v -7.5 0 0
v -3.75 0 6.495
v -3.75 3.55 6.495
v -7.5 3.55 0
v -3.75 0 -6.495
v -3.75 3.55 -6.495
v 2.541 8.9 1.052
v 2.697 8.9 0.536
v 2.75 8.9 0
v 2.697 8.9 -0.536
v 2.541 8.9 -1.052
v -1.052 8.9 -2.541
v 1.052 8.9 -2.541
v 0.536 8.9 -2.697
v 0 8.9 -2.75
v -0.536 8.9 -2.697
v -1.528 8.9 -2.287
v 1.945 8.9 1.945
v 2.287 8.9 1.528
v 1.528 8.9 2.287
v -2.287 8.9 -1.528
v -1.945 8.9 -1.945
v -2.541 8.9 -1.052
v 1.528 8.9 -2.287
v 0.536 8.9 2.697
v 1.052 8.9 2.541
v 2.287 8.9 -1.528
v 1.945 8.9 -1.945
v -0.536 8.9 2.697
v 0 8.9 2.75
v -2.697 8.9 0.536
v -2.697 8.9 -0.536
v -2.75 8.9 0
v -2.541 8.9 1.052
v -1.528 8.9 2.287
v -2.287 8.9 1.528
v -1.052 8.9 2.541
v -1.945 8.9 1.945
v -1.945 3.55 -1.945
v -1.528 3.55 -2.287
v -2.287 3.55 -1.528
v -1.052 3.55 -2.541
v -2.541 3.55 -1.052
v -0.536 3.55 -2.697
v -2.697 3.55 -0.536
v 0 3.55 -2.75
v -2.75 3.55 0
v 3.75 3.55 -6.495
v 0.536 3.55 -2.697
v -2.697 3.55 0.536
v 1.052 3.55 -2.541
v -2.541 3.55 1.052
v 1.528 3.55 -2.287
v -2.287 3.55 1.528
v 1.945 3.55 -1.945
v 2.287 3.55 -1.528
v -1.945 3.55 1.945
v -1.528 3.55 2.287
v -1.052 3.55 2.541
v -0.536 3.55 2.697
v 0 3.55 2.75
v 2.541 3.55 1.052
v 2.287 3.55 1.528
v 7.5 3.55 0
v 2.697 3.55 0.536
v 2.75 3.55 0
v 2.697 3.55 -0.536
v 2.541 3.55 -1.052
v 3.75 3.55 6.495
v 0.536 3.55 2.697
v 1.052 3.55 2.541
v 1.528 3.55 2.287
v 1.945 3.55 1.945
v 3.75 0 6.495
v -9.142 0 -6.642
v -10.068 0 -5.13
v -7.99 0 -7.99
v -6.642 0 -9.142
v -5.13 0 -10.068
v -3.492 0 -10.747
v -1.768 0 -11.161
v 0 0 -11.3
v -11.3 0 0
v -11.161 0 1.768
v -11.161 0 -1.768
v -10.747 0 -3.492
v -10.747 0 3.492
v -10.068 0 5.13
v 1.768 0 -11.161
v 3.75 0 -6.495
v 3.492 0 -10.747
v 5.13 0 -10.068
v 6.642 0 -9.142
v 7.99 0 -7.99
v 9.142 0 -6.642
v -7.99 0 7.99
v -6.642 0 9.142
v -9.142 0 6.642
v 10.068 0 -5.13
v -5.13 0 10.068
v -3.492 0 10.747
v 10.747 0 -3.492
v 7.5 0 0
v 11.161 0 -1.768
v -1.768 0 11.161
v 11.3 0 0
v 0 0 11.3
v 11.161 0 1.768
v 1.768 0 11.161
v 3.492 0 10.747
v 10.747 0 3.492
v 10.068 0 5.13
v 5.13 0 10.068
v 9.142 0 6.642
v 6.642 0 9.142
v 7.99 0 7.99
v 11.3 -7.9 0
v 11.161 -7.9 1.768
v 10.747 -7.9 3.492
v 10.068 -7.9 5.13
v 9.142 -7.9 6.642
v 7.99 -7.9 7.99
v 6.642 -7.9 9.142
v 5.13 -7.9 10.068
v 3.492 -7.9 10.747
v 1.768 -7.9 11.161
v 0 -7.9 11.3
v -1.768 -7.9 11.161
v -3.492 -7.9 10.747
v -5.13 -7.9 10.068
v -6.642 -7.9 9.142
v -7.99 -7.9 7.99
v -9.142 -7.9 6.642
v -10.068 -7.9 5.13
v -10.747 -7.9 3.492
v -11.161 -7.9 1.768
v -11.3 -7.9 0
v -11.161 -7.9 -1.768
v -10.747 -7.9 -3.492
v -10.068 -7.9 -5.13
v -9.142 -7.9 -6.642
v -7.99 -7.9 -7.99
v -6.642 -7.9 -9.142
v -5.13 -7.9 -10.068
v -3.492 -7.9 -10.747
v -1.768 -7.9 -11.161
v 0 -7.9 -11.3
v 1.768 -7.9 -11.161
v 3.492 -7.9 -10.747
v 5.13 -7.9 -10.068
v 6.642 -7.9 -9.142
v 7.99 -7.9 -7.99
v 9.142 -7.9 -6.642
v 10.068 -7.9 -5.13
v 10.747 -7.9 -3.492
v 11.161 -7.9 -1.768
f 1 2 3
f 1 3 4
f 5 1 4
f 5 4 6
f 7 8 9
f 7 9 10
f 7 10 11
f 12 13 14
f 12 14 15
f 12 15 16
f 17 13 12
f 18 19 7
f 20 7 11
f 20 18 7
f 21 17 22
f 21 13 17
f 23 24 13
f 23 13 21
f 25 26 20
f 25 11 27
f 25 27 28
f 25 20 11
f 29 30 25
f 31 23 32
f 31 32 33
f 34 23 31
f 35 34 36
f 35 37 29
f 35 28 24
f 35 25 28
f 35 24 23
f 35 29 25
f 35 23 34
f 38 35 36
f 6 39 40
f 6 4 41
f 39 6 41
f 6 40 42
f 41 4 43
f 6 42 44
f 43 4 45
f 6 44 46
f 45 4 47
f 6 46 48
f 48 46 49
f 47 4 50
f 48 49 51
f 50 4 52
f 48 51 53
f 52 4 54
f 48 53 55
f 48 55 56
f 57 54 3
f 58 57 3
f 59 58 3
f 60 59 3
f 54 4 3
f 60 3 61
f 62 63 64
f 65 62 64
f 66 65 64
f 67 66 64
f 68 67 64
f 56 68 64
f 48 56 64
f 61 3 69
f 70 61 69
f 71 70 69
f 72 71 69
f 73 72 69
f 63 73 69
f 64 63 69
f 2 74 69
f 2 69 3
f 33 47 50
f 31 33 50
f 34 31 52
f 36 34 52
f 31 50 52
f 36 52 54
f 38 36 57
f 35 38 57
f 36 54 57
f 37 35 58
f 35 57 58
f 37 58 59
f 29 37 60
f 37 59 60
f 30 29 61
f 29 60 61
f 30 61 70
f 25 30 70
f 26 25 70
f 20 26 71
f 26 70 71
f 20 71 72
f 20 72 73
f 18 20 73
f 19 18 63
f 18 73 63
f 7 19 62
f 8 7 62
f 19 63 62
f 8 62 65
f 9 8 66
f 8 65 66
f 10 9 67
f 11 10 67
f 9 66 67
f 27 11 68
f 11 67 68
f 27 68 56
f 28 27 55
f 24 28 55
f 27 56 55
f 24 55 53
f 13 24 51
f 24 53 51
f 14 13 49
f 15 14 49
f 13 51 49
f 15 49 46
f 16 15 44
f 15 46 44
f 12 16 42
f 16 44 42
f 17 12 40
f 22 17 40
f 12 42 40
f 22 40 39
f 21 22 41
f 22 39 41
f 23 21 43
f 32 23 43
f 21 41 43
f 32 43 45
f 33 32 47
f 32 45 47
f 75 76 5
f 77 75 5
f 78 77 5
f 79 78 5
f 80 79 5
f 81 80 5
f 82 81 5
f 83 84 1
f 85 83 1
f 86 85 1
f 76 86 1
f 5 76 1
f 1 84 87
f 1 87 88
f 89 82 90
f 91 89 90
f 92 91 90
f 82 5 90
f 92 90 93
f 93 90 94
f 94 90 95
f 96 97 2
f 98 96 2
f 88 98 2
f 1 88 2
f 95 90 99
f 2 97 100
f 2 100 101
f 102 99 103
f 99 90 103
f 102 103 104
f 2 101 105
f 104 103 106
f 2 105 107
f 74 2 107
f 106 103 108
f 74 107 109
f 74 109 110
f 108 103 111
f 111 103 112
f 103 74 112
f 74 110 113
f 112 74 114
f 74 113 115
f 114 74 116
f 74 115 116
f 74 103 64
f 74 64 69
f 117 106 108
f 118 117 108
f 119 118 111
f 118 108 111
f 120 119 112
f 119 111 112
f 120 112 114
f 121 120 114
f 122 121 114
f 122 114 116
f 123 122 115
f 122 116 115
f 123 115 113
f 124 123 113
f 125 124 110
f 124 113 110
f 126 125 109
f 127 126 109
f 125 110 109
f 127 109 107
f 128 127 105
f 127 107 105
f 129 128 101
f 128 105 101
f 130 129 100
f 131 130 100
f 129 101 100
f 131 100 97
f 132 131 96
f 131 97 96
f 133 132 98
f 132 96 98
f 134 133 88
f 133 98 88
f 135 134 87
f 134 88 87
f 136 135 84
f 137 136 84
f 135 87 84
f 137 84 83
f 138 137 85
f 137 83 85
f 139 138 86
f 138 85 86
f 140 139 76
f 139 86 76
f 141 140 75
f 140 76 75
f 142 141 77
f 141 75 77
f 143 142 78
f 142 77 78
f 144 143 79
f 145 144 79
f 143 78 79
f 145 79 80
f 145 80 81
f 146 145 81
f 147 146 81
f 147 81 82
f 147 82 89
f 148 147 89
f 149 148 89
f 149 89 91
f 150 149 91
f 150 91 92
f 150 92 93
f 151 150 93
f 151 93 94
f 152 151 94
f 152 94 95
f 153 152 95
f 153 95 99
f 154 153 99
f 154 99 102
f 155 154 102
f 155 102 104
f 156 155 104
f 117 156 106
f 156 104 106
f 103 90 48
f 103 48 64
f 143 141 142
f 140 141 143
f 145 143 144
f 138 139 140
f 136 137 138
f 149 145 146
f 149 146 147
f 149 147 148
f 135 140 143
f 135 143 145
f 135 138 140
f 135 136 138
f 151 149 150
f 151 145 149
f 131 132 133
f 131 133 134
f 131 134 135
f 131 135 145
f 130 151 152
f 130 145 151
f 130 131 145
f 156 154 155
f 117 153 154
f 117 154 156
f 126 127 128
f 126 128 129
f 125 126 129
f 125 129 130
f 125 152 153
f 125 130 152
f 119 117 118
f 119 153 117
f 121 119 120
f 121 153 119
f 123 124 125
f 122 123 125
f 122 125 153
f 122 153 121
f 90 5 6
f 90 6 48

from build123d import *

# Parameters (mm, degrees)
F0_R     = 11.3
F1_DEPTH = 7.9
F3_DEPTH = 3.55
F4_R     = 2.75
F5_DEPTH = 5.35


with BuildPart() as f1:
    # F0 (on Front) → F1 (new body)
    with BuildSketch(Plane.XZ):
        Circle(F0_R)
    extrude(amount=F1_DEPTH)

    # F2 (on Front) → F3 (join)
    with BuildSketch(Plane.XZ):
        Polygon((-3.75, 6.495191), (-7.5, 0), (-3.75, -6.495191), (3.75, -6.495191), (7.5, 0), (3.75, 6.495191), align=None)
    extrude(amount=-F3_DEPTH)

    # F4 (on face) → F5 (join)
    with BuildSketch(Plane(origin=(0, 3.55, 0), x_dir=(-1, 0, 0), z_dir=(0, 1, 0))):
        Circle(F4_R)
    extrude(amount=F5_DEPTH)


solid = f1.part
